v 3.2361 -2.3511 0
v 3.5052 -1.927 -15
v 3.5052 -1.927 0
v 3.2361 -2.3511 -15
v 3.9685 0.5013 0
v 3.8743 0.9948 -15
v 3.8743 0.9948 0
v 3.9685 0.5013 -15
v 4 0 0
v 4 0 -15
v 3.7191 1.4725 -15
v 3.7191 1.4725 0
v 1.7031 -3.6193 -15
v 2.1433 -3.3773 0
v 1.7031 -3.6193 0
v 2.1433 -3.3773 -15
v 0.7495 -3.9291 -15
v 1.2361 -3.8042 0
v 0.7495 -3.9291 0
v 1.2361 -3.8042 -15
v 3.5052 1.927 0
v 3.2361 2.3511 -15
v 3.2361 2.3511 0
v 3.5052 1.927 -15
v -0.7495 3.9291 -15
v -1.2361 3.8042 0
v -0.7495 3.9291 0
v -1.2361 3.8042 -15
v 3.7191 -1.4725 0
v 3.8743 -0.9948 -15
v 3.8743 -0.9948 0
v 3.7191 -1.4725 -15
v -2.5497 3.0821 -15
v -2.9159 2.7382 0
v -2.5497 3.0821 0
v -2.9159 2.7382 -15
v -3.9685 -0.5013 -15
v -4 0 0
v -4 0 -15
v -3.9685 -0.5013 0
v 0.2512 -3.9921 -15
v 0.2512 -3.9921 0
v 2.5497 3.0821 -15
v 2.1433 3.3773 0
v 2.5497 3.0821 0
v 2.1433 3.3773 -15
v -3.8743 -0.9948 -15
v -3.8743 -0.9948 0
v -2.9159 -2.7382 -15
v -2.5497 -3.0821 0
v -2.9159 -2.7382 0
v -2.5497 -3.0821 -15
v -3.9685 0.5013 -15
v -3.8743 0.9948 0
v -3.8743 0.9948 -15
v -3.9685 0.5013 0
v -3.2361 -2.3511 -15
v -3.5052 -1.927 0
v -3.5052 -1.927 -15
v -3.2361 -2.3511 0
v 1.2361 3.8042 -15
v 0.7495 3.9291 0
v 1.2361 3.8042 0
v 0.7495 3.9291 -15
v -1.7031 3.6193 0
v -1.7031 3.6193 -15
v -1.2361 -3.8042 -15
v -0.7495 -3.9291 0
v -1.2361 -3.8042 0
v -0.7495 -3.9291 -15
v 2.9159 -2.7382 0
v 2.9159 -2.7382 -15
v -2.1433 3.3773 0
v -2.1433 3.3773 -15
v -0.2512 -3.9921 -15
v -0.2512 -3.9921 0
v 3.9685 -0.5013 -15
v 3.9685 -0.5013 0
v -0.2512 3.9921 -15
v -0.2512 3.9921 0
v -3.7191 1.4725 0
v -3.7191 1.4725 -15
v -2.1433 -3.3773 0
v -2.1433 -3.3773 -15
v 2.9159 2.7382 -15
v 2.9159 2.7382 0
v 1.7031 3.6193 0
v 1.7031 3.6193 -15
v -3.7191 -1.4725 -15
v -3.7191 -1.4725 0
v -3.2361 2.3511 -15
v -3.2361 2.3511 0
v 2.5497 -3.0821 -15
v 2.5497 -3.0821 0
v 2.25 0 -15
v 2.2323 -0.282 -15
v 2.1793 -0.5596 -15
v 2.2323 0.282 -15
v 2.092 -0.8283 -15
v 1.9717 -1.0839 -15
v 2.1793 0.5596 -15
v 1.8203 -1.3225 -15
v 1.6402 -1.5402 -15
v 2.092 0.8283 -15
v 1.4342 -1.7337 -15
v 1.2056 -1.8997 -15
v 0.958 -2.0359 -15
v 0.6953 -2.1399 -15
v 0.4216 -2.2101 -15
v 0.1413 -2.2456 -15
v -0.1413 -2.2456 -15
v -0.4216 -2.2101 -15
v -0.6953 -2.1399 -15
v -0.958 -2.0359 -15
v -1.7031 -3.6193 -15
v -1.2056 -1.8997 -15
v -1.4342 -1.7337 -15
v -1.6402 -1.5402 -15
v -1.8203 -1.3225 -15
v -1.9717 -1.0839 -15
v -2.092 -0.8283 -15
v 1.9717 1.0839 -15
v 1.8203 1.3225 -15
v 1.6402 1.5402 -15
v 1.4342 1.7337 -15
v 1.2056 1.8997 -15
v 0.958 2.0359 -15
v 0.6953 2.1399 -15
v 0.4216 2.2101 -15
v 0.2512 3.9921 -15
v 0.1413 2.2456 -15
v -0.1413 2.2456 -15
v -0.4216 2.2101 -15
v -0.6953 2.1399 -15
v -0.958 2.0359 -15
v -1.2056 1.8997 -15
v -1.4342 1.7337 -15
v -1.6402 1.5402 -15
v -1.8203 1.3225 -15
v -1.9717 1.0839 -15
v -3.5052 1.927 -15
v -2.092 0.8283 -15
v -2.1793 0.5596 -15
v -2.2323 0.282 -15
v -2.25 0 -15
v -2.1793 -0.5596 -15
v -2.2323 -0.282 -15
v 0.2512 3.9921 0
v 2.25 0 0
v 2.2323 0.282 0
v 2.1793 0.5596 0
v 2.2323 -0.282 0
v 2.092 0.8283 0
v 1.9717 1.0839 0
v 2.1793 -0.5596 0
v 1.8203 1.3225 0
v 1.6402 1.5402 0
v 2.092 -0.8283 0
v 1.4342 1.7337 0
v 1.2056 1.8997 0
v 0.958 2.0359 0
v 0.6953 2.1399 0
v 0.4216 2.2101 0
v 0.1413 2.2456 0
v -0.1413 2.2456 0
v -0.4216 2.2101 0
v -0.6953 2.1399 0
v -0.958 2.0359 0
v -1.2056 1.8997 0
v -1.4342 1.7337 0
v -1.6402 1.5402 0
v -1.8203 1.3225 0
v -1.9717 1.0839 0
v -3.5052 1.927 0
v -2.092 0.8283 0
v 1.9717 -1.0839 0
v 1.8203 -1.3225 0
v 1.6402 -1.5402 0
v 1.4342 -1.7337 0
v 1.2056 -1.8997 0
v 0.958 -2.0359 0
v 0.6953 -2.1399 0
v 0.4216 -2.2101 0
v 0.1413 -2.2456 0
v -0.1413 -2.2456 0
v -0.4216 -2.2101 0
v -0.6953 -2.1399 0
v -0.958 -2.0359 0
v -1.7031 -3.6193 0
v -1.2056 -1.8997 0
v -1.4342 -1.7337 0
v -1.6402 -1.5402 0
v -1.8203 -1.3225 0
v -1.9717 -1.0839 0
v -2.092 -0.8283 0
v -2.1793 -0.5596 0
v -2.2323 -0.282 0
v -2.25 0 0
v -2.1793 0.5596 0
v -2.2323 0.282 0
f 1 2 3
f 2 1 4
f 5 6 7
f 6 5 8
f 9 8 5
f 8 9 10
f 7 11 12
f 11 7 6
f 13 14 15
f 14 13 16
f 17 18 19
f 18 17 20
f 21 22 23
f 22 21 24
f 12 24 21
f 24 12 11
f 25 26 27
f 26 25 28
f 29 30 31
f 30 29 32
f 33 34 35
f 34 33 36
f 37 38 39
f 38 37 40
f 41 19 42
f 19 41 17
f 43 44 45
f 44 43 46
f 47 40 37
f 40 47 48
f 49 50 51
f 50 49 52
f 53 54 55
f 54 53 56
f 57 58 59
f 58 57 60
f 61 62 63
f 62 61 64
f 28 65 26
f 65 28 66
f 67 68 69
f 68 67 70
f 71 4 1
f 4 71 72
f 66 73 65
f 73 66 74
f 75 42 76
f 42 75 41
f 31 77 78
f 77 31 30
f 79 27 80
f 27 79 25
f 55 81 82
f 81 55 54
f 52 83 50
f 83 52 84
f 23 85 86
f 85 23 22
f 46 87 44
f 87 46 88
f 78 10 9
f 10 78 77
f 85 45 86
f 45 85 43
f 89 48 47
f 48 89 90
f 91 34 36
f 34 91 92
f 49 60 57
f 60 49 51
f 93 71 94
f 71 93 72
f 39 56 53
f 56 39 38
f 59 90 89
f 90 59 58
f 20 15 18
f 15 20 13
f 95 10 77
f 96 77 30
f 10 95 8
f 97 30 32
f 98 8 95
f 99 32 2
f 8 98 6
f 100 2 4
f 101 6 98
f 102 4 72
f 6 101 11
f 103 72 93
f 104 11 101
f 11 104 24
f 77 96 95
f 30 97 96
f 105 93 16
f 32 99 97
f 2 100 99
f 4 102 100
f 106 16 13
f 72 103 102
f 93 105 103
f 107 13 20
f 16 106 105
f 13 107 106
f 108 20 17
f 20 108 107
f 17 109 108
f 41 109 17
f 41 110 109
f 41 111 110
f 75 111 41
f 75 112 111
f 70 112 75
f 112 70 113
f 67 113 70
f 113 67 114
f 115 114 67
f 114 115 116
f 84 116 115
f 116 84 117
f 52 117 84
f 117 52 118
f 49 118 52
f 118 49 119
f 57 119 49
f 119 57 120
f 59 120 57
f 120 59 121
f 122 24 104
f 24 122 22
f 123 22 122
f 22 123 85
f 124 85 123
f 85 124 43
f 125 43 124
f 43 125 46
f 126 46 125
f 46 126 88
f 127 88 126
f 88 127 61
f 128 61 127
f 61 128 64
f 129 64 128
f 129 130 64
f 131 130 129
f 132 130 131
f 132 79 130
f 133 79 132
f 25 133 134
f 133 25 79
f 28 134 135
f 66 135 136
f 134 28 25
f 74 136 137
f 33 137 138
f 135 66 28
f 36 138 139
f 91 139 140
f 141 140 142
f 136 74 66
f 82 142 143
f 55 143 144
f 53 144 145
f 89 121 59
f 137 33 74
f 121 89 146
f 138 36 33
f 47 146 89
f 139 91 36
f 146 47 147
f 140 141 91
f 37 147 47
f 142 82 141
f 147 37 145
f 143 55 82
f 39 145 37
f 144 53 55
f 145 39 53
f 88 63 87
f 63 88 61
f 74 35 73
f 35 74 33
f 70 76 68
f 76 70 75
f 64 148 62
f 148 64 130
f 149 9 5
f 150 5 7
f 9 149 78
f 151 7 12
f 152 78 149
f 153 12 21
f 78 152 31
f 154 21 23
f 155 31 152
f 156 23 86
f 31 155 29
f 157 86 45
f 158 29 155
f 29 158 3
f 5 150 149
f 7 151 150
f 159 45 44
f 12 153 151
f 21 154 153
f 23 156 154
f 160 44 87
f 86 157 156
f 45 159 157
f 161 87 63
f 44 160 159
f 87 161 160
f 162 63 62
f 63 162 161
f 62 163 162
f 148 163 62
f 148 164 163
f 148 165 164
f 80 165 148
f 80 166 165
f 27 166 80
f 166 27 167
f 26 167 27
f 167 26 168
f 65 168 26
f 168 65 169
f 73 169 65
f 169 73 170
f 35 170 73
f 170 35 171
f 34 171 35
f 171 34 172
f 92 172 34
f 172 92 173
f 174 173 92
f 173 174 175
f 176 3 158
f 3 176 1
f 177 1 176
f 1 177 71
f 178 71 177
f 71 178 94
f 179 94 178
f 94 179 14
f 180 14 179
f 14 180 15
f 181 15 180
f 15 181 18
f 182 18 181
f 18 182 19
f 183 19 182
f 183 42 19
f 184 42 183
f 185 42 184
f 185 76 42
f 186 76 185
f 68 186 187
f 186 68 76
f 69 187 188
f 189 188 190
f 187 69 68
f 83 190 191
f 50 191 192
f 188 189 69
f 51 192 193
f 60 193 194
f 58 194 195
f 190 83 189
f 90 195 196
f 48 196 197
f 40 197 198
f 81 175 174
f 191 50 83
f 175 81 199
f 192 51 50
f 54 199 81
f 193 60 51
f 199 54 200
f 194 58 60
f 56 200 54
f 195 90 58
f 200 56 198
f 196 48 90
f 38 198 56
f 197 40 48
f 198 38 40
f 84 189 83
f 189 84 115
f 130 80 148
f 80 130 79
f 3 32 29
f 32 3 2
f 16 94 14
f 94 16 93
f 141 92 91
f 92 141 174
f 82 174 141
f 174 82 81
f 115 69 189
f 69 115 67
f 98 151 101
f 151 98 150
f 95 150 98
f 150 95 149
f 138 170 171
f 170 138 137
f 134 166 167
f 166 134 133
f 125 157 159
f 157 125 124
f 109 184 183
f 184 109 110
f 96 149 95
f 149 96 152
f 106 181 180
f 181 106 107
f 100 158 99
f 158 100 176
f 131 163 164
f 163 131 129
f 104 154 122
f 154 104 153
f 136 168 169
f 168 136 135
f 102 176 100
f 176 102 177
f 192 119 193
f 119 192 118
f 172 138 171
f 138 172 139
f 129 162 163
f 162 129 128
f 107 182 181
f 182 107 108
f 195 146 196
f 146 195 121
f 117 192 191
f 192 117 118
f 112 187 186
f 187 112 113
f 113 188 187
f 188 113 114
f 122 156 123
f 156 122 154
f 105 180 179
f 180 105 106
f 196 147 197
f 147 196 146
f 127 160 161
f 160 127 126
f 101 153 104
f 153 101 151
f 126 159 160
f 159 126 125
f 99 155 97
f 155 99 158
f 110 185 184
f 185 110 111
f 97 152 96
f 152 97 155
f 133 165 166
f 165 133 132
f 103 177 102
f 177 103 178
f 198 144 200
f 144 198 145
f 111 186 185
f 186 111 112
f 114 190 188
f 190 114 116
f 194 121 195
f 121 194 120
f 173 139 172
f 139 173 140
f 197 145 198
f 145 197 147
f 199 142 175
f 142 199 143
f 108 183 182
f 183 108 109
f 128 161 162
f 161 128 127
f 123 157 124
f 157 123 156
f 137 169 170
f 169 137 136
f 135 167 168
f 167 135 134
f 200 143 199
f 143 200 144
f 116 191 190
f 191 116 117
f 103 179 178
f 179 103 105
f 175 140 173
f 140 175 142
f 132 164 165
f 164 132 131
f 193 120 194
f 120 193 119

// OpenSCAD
$fn = 50;


difference() {
	union() {
		translate(v = [0, 0, -15.0000000000]) {
			cylinder(h = 15, r = 4.0000000000);
		}
		cylinder(h = 0, r = 7.0000000000);
	}
	union() {
		#translate(v = [0, 0, -15]) {
			cylinder(h = 15, r = 2.2500000000);
		}
	}
}
